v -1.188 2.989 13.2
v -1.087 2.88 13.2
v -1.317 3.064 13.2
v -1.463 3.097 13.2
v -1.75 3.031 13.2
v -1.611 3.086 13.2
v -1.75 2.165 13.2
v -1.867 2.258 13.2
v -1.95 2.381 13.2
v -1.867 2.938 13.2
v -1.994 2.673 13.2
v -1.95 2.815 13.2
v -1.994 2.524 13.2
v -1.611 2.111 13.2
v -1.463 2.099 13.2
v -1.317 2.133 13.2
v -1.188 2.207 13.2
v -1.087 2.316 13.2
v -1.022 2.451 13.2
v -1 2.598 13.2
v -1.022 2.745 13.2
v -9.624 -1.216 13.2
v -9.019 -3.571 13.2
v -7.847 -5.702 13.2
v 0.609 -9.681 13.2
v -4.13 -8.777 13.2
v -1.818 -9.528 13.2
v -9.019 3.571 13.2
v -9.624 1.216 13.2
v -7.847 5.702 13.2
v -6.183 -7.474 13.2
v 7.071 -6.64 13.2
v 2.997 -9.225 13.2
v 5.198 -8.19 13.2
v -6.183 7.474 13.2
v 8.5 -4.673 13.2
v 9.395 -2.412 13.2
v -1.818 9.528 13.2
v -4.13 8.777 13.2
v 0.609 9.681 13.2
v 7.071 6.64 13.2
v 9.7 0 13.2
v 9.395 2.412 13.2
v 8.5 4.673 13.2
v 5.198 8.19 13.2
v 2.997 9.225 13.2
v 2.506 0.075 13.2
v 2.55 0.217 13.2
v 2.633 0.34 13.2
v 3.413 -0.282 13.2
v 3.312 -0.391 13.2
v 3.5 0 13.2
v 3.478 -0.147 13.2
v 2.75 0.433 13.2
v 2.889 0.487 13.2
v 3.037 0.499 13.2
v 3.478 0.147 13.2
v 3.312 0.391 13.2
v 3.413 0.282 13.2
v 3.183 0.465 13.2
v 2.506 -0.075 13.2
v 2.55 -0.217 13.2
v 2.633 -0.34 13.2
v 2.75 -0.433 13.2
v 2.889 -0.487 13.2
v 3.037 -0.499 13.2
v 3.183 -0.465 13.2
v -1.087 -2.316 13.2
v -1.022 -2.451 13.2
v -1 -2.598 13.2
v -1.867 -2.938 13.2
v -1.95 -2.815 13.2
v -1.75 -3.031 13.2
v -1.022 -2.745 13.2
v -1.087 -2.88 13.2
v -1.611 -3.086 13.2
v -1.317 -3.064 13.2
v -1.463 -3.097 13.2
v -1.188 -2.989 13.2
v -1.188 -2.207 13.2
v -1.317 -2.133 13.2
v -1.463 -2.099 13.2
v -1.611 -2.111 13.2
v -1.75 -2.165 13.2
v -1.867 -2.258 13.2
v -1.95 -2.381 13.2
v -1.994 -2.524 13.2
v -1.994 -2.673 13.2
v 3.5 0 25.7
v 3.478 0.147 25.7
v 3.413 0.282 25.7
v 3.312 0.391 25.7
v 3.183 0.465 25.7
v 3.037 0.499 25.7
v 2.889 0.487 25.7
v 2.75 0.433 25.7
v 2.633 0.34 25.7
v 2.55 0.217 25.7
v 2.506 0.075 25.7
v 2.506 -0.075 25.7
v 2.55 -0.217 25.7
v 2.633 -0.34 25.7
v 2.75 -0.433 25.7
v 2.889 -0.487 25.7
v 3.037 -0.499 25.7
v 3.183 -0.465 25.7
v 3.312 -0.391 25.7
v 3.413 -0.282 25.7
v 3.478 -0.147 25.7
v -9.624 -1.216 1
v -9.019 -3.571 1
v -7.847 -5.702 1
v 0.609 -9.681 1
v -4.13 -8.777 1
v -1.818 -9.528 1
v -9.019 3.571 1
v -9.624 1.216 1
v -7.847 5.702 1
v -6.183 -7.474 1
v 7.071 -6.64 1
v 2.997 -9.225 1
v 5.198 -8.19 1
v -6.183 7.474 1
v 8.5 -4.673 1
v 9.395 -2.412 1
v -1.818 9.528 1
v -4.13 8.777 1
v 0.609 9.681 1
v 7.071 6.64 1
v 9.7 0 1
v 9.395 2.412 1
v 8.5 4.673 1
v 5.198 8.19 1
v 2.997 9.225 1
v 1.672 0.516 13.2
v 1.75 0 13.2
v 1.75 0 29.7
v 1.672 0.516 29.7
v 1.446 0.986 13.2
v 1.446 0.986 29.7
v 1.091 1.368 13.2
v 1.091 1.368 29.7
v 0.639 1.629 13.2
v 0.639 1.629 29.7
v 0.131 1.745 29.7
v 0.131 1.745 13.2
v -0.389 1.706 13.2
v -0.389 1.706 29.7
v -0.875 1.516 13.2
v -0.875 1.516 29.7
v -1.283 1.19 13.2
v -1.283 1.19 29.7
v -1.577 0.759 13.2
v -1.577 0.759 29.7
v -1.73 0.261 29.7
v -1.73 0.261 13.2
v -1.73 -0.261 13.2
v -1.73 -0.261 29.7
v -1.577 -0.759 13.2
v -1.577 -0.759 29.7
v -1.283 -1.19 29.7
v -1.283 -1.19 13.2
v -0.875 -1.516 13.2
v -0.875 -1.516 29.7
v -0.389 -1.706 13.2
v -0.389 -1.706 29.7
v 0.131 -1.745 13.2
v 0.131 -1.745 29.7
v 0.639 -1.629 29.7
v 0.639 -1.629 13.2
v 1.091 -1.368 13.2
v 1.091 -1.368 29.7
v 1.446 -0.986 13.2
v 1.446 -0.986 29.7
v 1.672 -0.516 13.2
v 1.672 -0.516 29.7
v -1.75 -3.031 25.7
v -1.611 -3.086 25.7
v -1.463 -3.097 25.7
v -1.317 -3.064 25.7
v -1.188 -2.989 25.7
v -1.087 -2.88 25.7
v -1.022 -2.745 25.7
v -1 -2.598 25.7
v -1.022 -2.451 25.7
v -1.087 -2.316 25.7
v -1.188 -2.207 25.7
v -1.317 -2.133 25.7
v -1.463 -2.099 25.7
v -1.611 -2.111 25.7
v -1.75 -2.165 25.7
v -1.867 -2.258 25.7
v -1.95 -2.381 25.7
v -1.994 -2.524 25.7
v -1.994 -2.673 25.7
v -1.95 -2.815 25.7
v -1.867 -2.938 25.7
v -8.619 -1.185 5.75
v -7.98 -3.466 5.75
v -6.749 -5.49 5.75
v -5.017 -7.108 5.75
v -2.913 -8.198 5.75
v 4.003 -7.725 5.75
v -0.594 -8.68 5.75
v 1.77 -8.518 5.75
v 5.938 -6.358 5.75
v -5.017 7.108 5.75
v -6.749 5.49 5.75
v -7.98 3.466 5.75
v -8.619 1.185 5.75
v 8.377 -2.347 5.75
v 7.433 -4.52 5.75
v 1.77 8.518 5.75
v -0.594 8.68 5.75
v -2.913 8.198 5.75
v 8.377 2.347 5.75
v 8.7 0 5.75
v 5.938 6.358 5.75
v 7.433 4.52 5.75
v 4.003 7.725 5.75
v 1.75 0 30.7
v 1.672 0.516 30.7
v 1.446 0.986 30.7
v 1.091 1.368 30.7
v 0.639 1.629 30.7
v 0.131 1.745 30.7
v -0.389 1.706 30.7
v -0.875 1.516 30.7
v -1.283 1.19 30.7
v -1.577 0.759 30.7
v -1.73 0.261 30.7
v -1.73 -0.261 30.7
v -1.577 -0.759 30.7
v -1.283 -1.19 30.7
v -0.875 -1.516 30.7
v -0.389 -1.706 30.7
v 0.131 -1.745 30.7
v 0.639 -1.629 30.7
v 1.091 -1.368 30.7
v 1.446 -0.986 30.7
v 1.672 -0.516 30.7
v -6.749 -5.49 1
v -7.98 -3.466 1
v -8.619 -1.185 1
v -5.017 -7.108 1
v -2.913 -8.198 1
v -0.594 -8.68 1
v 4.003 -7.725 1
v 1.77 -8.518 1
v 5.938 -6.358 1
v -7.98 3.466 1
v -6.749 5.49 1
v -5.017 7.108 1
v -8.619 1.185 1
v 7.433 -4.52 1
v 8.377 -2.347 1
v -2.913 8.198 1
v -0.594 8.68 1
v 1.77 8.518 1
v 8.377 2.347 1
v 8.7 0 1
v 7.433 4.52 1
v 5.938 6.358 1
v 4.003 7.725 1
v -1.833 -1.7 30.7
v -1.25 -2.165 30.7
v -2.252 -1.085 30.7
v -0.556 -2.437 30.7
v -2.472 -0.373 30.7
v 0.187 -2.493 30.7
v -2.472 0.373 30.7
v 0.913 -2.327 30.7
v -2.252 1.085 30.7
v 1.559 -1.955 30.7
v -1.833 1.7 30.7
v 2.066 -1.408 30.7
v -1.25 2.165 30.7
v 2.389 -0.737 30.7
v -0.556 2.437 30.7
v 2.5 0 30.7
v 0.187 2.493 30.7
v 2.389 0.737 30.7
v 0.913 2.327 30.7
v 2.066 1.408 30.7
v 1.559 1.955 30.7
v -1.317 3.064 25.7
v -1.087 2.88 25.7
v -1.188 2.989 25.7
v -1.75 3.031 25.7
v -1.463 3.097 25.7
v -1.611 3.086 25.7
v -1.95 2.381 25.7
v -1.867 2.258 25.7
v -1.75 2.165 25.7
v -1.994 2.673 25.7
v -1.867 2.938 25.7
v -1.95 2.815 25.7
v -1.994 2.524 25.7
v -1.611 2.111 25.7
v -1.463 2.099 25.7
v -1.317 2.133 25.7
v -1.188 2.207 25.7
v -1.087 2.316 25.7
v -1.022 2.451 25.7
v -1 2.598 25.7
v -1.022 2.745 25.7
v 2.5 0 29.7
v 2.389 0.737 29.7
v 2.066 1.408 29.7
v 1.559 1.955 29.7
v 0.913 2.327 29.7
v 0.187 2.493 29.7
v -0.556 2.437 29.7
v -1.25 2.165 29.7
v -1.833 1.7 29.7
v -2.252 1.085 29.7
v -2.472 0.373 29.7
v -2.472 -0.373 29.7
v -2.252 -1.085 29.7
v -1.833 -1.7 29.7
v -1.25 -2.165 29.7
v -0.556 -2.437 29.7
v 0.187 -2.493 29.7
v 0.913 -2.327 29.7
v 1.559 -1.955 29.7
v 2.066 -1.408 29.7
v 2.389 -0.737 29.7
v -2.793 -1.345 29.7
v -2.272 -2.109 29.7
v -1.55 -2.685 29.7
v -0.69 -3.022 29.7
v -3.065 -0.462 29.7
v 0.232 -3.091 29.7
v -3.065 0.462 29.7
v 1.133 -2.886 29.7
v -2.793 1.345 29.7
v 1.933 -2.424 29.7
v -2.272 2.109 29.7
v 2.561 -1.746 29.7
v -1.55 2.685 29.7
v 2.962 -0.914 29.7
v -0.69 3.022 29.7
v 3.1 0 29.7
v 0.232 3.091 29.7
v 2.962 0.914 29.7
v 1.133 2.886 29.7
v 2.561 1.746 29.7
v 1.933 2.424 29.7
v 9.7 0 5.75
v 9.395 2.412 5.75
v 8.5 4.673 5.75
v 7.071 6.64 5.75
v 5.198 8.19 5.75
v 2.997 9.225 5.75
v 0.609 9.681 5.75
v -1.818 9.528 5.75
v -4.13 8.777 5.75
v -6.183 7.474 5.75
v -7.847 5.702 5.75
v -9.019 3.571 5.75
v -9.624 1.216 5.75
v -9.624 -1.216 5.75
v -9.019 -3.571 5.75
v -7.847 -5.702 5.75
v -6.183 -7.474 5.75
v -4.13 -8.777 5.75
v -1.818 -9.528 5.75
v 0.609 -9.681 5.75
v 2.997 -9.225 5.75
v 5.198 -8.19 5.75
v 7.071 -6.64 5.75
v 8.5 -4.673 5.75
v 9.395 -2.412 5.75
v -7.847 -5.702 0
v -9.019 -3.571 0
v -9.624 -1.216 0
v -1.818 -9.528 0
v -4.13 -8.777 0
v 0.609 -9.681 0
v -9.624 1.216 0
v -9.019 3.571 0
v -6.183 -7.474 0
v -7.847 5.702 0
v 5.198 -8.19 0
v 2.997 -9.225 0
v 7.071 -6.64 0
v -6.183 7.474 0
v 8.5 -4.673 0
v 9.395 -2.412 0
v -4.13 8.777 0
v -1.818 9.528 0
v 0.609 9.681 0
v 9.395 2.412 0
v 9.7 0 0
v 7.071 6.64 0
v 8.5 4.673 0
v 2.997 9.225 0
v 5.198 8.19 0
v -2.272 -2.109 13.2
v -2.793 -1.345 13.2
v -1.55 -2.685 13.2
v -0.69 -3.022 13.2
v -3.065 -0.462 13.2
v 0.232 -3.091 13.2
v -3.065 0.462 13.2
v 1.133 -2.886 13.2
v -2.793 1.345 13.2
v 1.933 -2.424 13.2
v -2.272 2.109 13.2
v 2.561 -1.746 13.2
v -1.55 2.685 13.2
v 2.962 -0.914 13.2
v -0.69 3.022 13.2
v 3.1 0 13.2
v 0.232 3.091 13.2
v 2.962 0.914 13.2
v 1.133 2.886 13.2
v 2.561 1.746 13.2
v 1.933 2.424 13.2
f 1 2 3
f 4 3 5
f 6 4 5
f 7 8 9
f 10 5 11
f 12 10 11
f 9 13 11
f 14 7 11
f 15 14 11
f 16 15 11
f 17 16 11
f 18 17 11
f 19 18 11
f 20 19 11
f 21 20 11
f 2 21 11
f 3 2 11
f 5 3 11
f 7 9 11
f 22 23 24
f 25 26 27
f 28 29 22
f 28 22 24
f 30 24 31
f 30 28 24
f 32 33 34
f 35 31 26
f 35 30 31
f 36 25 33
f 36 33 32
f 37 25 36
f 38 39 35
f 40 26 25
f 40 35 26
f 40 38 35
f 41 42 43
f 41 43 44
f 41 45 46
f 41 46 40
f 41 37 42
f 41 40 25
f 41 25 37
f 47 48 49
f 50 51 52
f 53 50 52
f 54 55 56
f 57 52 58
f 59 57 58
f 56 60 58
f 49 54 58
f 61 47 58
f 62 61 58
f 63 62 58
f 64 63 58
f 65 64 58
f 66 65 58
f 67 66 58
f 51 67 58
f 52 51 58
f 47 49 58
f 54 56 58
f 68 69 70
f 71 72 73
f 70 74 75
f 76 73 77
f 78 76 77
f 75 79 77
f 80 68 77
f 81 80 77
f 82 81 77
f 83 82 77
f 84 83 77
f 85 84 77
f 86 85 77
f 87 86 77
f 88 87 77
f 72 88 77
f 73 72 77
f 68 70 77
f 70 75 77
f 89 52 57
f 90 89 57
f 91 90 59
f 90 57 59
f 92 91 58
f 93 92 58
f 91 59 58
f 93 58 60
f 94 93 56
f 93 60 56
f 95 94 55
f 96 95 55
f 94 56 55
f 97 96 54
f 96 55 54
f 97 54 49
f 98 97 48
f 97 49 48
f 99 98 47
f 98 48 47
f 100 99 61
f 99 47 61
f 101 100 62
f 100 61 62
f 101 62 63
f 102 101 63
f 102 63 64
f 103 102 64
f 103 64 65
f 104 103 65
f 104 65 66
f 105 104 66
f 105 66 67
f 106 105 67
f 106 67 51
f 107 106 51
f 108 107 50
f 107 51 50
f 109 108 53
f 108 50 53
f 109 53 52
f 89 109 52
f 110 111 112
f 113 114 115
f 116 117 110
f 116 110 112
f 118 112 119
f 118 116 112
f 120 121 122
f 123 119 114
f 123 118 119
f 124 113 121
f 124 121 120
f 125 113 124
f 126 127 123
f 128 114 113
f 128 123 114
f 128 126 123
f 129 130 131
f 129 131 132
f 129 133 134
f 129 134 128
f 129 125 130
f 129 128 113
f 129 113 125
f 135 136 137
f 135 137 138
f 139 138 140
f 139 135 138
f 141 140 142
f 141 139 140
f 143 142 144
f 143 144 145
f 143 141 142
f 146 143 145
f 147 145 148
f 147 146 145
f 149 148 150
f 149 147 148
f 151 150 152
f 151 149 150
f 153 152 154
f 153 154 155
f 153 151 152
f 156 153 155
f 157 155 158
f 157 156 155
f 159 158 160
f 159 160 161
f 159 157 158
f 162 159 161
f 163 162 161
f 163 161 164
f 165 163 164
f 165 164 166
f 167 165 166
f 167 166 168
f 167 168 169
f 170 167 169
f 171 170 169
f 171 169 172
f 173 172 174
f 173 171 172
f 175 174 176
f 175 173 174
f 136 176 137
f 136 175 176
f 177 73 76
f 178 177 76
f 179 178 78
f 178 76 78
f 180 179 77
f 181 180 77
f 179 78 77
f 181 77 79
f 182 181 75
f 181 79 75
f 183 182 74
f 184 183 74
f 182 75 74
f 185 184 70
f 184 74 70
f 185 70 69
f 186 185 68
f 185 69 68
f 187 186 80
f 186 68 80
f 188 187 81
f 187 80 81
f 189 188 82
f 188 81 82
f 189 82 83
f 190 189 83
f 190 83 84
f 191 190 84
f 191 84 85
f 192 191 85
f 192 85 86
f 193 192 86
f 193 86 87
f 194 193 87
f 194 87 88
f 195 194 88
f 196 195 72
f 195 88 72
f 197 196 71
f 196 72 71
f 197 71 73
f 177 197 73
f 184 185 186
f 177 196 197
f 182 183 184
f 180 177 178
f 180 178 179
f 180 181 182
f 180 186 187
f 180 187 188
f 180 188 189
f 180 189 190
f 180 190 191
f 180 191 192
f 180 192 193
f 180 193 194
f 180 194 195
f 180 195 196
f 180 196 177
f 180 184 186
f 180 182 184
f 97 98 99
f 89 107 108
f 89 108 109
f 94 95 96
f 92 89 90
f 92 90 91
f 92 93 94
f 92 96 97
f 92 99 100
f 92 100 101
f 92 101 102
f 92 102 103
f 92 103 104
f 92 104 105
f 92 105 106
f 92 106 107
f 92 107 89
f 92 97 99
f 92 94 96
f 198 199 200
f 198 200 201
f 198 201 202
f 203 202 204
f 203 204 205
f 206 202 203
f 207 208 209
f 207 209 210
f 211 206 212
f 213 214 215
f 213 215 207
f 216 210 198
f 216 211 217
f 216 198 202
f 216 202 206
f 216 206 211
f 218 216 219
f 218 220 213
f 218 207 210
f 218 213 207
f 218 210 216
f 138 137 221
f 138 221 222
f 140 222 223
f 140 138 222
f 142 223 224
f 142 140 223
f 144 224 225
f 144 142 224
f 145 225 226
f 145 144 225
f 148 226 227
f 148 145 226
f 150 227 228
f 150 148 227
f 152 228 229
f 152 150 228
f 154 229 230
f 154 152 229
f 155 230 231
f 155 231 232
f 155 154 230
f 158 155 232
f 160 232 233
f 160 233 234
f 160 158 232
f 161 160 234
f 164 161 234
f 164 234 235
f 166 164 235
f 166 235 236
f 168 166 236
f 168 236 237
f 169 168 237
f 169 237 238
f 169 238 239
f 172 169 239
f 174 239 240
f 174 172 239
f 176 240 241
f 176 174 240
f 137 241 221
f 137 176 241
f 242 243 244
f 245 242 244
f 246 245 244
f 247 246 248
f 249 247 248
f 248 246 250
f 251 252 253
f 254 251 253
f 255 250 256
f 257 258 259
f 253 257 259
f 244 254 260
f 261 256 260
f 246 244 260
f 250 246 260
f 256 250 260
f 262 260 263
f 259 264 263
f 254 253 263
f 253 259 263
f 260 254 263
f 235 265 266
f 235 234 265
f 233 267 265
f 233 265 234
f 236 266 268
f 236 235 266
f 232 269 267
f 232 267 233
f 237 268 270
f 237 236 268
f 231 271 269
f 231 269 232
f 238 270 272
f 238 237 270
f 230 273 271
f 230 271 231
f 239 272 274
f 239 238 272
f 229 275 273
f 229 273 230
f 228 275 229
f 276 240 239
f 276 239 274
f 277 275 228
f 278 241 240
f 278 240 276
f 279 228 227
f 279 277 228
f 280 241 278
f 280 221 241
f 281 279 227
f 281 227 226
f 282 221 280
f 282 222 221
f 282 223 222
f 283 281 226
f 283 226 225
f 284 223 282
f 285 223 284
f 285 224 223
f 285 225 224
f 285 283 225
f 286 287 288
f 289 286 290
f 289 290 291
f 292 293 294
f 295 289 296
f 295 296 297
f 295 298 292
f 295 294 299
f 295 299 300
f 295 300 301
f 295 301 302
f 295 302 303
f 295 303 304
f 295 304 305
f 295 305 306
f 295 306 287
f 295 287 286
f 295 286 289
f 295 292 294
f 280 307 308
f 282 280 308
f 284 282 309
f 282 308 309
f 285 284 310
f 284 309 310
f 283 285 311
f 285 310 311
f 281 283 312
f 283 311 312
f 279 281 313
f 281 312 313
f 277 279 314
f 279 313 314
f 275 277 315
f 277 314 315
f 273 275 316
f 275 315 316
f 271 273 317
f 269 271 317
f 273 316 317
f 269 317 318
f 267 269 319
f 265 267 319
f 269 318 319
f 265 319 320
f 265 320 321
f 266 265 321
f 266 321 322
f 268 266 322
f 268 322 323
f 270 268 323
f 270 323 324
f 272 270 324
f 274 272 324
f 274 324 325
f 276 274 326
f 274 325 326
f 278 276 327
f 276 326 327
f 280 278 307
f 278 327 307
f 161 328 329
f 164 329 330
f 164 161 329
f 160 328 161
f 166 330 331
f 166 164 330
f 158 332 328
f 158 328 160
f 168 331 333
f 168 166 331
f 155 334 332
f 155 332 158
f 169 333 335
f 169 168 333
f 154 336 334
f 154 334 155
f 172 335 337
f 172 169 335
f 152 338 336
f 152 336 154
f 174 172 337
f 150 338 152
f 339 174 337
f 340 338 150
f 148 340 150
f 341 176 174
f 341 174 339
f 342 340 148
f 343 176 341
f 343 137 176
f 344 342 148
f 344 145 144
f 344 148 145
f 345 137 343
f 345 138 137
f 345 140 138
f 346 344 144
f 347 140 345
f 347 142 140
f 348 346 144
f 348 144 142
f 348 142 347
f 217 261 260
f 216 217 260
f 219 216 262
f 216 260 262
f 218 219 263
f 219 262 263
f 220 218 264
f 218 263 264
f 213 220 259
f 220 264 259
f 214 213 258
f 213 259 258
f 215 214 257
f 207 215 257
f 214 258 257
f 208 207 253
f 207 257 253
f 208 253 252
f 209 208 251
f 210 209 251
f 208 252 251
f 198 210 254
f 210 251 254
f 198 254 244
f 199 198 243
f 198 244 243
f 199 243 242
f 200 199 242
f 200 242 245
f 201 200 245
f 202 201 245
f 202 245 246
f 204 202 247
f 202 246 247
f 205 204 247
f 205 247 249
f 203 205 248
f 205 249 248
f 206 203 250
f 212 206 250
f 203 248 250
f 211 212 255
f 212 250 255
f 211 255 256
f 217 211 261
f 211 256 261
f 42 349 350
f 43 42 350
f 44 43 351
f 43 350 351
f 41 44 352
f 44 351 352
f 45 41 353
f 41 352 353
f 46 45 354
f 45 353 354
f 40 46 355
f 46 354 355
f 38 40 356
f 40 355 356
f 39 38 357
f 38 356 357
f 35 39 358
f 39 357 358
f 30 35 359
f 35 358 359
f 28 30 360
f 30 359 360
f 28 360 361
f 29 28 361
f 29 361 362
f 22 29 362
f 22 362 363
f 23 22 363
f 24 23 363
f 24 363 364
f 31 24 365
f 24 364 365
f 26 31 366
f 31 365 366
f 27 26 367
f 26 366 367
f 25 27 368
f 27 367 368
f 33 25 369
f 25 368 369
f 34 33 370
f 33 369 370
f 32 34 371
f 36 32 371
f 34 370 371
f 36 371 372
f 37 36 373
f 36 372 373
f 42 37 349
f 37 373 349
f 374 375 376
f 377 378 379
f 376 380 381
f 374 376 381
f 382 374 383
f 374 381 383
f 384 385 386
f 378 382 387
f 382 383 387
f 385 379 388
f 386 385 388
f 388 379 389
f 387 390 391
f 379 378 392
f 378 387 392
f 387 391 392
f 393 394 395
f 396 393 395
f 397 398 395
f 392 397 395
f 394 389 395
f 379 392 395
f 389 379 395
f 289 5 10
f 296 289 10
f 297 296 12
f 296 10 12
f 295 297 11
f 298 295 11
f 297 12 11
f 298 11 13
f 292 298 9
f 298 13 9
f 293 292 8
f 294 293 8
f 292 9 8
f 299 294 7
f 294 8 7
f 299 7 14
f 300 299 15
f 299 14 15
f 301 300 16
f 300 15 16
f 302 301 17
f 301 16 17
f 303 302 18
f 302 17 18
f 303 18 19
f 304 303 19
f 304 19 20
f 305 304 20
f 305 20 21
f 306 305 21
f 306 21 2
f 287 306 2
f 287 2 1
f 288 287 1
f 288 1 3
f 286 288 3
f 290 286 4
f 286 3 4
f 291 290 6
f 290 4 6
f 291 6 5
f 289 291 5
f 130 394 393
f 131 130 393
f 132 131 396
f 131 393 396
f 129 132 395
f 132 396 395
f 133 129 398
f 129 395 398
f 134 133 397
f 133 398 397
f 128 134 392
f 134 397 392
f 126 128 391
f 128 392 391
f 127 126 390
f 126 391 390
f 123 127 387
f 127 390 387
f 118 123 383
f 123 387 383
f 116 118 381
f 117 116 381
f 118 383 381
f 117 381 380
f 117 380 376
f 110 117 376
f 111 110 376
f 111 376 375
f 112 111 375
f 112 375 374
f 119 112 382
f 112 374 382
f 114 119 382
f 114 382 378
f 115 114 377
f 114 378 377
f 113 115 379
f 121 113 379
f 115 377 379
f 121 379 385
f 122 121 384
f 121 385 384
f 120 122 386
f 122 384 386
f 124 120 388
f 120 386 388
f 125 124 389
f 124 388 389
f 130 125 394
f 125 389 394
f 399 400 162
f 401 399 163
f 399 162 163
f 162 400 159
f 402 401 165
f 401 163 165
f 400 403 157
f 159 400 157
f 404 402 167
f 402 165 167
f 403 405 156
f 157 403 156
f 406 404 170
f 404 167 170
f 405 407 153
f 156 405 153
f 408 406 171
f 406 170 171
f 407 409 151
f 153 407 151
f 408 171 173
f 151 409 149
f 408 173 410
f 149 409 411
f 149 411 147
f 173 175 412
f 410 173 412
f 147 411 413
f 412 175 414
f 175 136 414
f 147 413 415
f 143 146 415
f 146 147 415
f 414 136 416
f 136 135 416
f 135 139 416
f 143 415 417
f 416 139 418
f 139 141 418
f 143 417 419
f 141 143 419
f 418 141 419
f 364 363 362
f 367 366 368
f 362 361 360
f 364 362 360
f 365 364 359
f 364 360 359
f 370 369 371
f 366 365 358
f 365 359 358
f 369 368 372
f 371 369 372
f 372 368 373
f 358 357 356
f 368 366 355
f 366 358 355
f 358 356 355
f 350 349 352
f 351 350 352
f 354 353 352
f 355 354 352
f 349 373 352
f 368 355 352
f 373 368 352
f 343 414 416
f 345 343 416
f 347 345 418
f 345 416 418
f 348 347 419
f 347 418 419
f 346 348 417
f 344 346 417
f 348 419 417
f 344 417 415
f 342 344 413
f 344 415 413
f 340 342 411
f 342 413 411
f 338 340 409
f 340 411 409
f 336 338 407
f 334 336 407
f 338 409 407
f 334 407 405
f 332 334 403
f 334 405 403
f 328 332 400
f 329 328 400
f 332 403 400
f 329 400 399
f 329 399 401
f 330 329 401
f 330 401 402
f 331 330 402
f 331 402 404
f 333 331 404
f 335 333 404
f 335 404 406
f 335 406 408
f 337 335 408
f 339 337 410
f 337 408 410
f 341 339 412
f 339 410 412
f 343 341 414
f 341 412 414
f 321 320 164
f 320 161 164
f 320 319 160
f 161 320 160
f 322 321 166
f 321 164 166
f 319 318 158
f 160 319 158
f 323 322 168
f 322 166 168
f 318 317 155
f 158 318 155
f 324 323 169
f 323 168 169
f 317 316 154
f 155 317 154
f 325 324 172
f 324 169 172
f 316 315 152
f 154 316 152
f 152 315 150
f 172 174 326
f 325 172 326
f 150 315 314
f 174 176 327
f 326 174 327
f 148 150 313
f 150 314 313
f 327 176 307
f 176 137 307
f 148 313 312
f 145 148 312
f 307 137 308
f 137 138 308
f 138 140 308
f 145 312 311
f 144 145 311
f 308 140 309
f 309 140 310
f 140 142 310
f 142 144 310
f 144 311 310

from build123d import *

# Parameters (mm, degrees)
CYLINDER_R                  = 9.7
CYLINDER_DEPTH              = 7.45
CYLINDER001_R               = 8.7
CYLINDER001_DEPTH           = 4.75
CYLINDER002_R               = 9.7
CYLINDER002_DEPTH           = 1
CYLINDER006_R               = 0.5
CYLINDER006_DEPTH           = 12.5
CYLINDER007_R               = 1.75
CYLINDER007_DEPTH           = 16.5
CYLINDER003_R               = 3.1
CYLINDER003_DEPTH           = 16.5
CYLINDER005_R               = 1.75
CYLINDER005_DEPTH           = 1
CYLINDER004_R               = 2.5
CYLINDER004_DEPTH           = 1
CYLINDER008_R               = 0.5
CYLINDER008_DEPTH           = 12.5
CYLINDER008_PLACEMENT_ANGLE = 120
CYLINDER009_R               = 0.5
CYLINDER009_DEPTH           = 12.5
CYLINDER009_PLACEMENT_ANGLE = 240


with BuildPart() as bottom_upper:
    # Cylinder → Cylinder (new body)
    with BuildSketch(Plane.XY.offset(5.75)):
        Circle(CYLINDER_R)
    extrude(amount=CYLINDER_DEPTH)


with BuildPart() as cable_tie_groove:
    # Cylinder001 → Cylinder001 (new body)
    with BuildSketch(Plane.XY.offset(1)):
        Circle(CYLINDER001_R)
    extrude(amount=CYLINDER001_DEPTH)


with BuildPart() as bottom_lower:
    # Cylinder002 → Cylinder002 (new body)
    with BuildSketch(Plane.XY):
        Circle(CYLINDER002_R)
    extrude(amount=CYLINDER002_DEPTH)


with BuildPart() as cylinder006:
    # Cylinder006 → Cylinder006 (new body)
    with BuildSketch(Plane(origin=(3, 0, 13.2), x_dir=(1, 0, 0), z_dir=(0, 0, 1))):
        Circle(CYLINDER006_R)
    extrude(amount=CYLINDER006_DEPTH)


with BuildPart() as cylinder007:
    # Cylinder007 → Cylinder007 (new body)
    with BuildSketch(Plane.XY.offset(13.2)):
        Circle(CYLINDER007_R)
    extrude(amount=CYLINDER007_DEPTH)


with BuildPart() as cut:
    # Cylinder003 → Cylinder003 (new body)
    with BuildSketch(Plane.XY.offset(13.2)):
        Circle(CYLINDER003_R)
    extrude(amount=CYLINDER003_DEPTH)

    # Cut: cut Cylinder007
    add(cylinder007.part, mode=Mode.SUBTRACT)


with BuildPart() as cylinder005:
    # Cylinder005 → Cylinder005 (new body)
    with BuildSketch(Plane.XY.offset(29.7)):
        Circle(CYLINDER005_R)
    extrude(amount=CYLINDER005_DEPTH)


with BuildPart() as cut001:
    # Cylinder004 → Cylinder004 (new body)
    with BuildSketch(Plane.XY.offset(29.7)):
        Circle(CYLINDER004_R)
    extrude(amount=CYLINDER004_DEPTH)

    # Cut001: cut Cylinder005
    add(cylinder005.part, mode=Mode.SUBTRACT)


with BuildPart() as cylinder008:
    # Cylinder008 → Cylinder008 (new body)
    with BuildSketch(Plane.XY):
        Circle(CYLINDER008_R)
    extrude(amount=CYLINDER008_DEPTH)


with BuildPart() as cylinder008_1:
    # Cylinder008 placement: moved
    add(cylinder008.part.moved(Location((-1.5, 2.598076, 13.2))).rotate(Axis((-1.5, 2.598076, 13.2), (0, 0, 1)), CYLINDER008_PLACEMENT_ANGLE))


with BuildPart() as cylinder009:
    # Cylinder009 → Cylinder009 (new body)
    with BuildSketch(Plane.XY):
        Circle(CYLINDER009_R)
    extrude(amount=CYLINDER009_DEPTH)


with BuildPart() as cylinder009_1:
    # Cylinder009 placement: moved
    add(cylinder009.part.moved(Location((-1.5, -2.598076, 13.2))).rotate(Axis((-1.5, -2.598076, 13.2), (0, 0, 1)), CYLINDER009_PLACEMENT_ANGLE))


solid = Compound([bottom_upper.part, cable_tie_groove.part, bottom_lower.part, cylinder006.part, cut.part, cut001.part, cylinder008_1.part, cylinder009_1.part])
